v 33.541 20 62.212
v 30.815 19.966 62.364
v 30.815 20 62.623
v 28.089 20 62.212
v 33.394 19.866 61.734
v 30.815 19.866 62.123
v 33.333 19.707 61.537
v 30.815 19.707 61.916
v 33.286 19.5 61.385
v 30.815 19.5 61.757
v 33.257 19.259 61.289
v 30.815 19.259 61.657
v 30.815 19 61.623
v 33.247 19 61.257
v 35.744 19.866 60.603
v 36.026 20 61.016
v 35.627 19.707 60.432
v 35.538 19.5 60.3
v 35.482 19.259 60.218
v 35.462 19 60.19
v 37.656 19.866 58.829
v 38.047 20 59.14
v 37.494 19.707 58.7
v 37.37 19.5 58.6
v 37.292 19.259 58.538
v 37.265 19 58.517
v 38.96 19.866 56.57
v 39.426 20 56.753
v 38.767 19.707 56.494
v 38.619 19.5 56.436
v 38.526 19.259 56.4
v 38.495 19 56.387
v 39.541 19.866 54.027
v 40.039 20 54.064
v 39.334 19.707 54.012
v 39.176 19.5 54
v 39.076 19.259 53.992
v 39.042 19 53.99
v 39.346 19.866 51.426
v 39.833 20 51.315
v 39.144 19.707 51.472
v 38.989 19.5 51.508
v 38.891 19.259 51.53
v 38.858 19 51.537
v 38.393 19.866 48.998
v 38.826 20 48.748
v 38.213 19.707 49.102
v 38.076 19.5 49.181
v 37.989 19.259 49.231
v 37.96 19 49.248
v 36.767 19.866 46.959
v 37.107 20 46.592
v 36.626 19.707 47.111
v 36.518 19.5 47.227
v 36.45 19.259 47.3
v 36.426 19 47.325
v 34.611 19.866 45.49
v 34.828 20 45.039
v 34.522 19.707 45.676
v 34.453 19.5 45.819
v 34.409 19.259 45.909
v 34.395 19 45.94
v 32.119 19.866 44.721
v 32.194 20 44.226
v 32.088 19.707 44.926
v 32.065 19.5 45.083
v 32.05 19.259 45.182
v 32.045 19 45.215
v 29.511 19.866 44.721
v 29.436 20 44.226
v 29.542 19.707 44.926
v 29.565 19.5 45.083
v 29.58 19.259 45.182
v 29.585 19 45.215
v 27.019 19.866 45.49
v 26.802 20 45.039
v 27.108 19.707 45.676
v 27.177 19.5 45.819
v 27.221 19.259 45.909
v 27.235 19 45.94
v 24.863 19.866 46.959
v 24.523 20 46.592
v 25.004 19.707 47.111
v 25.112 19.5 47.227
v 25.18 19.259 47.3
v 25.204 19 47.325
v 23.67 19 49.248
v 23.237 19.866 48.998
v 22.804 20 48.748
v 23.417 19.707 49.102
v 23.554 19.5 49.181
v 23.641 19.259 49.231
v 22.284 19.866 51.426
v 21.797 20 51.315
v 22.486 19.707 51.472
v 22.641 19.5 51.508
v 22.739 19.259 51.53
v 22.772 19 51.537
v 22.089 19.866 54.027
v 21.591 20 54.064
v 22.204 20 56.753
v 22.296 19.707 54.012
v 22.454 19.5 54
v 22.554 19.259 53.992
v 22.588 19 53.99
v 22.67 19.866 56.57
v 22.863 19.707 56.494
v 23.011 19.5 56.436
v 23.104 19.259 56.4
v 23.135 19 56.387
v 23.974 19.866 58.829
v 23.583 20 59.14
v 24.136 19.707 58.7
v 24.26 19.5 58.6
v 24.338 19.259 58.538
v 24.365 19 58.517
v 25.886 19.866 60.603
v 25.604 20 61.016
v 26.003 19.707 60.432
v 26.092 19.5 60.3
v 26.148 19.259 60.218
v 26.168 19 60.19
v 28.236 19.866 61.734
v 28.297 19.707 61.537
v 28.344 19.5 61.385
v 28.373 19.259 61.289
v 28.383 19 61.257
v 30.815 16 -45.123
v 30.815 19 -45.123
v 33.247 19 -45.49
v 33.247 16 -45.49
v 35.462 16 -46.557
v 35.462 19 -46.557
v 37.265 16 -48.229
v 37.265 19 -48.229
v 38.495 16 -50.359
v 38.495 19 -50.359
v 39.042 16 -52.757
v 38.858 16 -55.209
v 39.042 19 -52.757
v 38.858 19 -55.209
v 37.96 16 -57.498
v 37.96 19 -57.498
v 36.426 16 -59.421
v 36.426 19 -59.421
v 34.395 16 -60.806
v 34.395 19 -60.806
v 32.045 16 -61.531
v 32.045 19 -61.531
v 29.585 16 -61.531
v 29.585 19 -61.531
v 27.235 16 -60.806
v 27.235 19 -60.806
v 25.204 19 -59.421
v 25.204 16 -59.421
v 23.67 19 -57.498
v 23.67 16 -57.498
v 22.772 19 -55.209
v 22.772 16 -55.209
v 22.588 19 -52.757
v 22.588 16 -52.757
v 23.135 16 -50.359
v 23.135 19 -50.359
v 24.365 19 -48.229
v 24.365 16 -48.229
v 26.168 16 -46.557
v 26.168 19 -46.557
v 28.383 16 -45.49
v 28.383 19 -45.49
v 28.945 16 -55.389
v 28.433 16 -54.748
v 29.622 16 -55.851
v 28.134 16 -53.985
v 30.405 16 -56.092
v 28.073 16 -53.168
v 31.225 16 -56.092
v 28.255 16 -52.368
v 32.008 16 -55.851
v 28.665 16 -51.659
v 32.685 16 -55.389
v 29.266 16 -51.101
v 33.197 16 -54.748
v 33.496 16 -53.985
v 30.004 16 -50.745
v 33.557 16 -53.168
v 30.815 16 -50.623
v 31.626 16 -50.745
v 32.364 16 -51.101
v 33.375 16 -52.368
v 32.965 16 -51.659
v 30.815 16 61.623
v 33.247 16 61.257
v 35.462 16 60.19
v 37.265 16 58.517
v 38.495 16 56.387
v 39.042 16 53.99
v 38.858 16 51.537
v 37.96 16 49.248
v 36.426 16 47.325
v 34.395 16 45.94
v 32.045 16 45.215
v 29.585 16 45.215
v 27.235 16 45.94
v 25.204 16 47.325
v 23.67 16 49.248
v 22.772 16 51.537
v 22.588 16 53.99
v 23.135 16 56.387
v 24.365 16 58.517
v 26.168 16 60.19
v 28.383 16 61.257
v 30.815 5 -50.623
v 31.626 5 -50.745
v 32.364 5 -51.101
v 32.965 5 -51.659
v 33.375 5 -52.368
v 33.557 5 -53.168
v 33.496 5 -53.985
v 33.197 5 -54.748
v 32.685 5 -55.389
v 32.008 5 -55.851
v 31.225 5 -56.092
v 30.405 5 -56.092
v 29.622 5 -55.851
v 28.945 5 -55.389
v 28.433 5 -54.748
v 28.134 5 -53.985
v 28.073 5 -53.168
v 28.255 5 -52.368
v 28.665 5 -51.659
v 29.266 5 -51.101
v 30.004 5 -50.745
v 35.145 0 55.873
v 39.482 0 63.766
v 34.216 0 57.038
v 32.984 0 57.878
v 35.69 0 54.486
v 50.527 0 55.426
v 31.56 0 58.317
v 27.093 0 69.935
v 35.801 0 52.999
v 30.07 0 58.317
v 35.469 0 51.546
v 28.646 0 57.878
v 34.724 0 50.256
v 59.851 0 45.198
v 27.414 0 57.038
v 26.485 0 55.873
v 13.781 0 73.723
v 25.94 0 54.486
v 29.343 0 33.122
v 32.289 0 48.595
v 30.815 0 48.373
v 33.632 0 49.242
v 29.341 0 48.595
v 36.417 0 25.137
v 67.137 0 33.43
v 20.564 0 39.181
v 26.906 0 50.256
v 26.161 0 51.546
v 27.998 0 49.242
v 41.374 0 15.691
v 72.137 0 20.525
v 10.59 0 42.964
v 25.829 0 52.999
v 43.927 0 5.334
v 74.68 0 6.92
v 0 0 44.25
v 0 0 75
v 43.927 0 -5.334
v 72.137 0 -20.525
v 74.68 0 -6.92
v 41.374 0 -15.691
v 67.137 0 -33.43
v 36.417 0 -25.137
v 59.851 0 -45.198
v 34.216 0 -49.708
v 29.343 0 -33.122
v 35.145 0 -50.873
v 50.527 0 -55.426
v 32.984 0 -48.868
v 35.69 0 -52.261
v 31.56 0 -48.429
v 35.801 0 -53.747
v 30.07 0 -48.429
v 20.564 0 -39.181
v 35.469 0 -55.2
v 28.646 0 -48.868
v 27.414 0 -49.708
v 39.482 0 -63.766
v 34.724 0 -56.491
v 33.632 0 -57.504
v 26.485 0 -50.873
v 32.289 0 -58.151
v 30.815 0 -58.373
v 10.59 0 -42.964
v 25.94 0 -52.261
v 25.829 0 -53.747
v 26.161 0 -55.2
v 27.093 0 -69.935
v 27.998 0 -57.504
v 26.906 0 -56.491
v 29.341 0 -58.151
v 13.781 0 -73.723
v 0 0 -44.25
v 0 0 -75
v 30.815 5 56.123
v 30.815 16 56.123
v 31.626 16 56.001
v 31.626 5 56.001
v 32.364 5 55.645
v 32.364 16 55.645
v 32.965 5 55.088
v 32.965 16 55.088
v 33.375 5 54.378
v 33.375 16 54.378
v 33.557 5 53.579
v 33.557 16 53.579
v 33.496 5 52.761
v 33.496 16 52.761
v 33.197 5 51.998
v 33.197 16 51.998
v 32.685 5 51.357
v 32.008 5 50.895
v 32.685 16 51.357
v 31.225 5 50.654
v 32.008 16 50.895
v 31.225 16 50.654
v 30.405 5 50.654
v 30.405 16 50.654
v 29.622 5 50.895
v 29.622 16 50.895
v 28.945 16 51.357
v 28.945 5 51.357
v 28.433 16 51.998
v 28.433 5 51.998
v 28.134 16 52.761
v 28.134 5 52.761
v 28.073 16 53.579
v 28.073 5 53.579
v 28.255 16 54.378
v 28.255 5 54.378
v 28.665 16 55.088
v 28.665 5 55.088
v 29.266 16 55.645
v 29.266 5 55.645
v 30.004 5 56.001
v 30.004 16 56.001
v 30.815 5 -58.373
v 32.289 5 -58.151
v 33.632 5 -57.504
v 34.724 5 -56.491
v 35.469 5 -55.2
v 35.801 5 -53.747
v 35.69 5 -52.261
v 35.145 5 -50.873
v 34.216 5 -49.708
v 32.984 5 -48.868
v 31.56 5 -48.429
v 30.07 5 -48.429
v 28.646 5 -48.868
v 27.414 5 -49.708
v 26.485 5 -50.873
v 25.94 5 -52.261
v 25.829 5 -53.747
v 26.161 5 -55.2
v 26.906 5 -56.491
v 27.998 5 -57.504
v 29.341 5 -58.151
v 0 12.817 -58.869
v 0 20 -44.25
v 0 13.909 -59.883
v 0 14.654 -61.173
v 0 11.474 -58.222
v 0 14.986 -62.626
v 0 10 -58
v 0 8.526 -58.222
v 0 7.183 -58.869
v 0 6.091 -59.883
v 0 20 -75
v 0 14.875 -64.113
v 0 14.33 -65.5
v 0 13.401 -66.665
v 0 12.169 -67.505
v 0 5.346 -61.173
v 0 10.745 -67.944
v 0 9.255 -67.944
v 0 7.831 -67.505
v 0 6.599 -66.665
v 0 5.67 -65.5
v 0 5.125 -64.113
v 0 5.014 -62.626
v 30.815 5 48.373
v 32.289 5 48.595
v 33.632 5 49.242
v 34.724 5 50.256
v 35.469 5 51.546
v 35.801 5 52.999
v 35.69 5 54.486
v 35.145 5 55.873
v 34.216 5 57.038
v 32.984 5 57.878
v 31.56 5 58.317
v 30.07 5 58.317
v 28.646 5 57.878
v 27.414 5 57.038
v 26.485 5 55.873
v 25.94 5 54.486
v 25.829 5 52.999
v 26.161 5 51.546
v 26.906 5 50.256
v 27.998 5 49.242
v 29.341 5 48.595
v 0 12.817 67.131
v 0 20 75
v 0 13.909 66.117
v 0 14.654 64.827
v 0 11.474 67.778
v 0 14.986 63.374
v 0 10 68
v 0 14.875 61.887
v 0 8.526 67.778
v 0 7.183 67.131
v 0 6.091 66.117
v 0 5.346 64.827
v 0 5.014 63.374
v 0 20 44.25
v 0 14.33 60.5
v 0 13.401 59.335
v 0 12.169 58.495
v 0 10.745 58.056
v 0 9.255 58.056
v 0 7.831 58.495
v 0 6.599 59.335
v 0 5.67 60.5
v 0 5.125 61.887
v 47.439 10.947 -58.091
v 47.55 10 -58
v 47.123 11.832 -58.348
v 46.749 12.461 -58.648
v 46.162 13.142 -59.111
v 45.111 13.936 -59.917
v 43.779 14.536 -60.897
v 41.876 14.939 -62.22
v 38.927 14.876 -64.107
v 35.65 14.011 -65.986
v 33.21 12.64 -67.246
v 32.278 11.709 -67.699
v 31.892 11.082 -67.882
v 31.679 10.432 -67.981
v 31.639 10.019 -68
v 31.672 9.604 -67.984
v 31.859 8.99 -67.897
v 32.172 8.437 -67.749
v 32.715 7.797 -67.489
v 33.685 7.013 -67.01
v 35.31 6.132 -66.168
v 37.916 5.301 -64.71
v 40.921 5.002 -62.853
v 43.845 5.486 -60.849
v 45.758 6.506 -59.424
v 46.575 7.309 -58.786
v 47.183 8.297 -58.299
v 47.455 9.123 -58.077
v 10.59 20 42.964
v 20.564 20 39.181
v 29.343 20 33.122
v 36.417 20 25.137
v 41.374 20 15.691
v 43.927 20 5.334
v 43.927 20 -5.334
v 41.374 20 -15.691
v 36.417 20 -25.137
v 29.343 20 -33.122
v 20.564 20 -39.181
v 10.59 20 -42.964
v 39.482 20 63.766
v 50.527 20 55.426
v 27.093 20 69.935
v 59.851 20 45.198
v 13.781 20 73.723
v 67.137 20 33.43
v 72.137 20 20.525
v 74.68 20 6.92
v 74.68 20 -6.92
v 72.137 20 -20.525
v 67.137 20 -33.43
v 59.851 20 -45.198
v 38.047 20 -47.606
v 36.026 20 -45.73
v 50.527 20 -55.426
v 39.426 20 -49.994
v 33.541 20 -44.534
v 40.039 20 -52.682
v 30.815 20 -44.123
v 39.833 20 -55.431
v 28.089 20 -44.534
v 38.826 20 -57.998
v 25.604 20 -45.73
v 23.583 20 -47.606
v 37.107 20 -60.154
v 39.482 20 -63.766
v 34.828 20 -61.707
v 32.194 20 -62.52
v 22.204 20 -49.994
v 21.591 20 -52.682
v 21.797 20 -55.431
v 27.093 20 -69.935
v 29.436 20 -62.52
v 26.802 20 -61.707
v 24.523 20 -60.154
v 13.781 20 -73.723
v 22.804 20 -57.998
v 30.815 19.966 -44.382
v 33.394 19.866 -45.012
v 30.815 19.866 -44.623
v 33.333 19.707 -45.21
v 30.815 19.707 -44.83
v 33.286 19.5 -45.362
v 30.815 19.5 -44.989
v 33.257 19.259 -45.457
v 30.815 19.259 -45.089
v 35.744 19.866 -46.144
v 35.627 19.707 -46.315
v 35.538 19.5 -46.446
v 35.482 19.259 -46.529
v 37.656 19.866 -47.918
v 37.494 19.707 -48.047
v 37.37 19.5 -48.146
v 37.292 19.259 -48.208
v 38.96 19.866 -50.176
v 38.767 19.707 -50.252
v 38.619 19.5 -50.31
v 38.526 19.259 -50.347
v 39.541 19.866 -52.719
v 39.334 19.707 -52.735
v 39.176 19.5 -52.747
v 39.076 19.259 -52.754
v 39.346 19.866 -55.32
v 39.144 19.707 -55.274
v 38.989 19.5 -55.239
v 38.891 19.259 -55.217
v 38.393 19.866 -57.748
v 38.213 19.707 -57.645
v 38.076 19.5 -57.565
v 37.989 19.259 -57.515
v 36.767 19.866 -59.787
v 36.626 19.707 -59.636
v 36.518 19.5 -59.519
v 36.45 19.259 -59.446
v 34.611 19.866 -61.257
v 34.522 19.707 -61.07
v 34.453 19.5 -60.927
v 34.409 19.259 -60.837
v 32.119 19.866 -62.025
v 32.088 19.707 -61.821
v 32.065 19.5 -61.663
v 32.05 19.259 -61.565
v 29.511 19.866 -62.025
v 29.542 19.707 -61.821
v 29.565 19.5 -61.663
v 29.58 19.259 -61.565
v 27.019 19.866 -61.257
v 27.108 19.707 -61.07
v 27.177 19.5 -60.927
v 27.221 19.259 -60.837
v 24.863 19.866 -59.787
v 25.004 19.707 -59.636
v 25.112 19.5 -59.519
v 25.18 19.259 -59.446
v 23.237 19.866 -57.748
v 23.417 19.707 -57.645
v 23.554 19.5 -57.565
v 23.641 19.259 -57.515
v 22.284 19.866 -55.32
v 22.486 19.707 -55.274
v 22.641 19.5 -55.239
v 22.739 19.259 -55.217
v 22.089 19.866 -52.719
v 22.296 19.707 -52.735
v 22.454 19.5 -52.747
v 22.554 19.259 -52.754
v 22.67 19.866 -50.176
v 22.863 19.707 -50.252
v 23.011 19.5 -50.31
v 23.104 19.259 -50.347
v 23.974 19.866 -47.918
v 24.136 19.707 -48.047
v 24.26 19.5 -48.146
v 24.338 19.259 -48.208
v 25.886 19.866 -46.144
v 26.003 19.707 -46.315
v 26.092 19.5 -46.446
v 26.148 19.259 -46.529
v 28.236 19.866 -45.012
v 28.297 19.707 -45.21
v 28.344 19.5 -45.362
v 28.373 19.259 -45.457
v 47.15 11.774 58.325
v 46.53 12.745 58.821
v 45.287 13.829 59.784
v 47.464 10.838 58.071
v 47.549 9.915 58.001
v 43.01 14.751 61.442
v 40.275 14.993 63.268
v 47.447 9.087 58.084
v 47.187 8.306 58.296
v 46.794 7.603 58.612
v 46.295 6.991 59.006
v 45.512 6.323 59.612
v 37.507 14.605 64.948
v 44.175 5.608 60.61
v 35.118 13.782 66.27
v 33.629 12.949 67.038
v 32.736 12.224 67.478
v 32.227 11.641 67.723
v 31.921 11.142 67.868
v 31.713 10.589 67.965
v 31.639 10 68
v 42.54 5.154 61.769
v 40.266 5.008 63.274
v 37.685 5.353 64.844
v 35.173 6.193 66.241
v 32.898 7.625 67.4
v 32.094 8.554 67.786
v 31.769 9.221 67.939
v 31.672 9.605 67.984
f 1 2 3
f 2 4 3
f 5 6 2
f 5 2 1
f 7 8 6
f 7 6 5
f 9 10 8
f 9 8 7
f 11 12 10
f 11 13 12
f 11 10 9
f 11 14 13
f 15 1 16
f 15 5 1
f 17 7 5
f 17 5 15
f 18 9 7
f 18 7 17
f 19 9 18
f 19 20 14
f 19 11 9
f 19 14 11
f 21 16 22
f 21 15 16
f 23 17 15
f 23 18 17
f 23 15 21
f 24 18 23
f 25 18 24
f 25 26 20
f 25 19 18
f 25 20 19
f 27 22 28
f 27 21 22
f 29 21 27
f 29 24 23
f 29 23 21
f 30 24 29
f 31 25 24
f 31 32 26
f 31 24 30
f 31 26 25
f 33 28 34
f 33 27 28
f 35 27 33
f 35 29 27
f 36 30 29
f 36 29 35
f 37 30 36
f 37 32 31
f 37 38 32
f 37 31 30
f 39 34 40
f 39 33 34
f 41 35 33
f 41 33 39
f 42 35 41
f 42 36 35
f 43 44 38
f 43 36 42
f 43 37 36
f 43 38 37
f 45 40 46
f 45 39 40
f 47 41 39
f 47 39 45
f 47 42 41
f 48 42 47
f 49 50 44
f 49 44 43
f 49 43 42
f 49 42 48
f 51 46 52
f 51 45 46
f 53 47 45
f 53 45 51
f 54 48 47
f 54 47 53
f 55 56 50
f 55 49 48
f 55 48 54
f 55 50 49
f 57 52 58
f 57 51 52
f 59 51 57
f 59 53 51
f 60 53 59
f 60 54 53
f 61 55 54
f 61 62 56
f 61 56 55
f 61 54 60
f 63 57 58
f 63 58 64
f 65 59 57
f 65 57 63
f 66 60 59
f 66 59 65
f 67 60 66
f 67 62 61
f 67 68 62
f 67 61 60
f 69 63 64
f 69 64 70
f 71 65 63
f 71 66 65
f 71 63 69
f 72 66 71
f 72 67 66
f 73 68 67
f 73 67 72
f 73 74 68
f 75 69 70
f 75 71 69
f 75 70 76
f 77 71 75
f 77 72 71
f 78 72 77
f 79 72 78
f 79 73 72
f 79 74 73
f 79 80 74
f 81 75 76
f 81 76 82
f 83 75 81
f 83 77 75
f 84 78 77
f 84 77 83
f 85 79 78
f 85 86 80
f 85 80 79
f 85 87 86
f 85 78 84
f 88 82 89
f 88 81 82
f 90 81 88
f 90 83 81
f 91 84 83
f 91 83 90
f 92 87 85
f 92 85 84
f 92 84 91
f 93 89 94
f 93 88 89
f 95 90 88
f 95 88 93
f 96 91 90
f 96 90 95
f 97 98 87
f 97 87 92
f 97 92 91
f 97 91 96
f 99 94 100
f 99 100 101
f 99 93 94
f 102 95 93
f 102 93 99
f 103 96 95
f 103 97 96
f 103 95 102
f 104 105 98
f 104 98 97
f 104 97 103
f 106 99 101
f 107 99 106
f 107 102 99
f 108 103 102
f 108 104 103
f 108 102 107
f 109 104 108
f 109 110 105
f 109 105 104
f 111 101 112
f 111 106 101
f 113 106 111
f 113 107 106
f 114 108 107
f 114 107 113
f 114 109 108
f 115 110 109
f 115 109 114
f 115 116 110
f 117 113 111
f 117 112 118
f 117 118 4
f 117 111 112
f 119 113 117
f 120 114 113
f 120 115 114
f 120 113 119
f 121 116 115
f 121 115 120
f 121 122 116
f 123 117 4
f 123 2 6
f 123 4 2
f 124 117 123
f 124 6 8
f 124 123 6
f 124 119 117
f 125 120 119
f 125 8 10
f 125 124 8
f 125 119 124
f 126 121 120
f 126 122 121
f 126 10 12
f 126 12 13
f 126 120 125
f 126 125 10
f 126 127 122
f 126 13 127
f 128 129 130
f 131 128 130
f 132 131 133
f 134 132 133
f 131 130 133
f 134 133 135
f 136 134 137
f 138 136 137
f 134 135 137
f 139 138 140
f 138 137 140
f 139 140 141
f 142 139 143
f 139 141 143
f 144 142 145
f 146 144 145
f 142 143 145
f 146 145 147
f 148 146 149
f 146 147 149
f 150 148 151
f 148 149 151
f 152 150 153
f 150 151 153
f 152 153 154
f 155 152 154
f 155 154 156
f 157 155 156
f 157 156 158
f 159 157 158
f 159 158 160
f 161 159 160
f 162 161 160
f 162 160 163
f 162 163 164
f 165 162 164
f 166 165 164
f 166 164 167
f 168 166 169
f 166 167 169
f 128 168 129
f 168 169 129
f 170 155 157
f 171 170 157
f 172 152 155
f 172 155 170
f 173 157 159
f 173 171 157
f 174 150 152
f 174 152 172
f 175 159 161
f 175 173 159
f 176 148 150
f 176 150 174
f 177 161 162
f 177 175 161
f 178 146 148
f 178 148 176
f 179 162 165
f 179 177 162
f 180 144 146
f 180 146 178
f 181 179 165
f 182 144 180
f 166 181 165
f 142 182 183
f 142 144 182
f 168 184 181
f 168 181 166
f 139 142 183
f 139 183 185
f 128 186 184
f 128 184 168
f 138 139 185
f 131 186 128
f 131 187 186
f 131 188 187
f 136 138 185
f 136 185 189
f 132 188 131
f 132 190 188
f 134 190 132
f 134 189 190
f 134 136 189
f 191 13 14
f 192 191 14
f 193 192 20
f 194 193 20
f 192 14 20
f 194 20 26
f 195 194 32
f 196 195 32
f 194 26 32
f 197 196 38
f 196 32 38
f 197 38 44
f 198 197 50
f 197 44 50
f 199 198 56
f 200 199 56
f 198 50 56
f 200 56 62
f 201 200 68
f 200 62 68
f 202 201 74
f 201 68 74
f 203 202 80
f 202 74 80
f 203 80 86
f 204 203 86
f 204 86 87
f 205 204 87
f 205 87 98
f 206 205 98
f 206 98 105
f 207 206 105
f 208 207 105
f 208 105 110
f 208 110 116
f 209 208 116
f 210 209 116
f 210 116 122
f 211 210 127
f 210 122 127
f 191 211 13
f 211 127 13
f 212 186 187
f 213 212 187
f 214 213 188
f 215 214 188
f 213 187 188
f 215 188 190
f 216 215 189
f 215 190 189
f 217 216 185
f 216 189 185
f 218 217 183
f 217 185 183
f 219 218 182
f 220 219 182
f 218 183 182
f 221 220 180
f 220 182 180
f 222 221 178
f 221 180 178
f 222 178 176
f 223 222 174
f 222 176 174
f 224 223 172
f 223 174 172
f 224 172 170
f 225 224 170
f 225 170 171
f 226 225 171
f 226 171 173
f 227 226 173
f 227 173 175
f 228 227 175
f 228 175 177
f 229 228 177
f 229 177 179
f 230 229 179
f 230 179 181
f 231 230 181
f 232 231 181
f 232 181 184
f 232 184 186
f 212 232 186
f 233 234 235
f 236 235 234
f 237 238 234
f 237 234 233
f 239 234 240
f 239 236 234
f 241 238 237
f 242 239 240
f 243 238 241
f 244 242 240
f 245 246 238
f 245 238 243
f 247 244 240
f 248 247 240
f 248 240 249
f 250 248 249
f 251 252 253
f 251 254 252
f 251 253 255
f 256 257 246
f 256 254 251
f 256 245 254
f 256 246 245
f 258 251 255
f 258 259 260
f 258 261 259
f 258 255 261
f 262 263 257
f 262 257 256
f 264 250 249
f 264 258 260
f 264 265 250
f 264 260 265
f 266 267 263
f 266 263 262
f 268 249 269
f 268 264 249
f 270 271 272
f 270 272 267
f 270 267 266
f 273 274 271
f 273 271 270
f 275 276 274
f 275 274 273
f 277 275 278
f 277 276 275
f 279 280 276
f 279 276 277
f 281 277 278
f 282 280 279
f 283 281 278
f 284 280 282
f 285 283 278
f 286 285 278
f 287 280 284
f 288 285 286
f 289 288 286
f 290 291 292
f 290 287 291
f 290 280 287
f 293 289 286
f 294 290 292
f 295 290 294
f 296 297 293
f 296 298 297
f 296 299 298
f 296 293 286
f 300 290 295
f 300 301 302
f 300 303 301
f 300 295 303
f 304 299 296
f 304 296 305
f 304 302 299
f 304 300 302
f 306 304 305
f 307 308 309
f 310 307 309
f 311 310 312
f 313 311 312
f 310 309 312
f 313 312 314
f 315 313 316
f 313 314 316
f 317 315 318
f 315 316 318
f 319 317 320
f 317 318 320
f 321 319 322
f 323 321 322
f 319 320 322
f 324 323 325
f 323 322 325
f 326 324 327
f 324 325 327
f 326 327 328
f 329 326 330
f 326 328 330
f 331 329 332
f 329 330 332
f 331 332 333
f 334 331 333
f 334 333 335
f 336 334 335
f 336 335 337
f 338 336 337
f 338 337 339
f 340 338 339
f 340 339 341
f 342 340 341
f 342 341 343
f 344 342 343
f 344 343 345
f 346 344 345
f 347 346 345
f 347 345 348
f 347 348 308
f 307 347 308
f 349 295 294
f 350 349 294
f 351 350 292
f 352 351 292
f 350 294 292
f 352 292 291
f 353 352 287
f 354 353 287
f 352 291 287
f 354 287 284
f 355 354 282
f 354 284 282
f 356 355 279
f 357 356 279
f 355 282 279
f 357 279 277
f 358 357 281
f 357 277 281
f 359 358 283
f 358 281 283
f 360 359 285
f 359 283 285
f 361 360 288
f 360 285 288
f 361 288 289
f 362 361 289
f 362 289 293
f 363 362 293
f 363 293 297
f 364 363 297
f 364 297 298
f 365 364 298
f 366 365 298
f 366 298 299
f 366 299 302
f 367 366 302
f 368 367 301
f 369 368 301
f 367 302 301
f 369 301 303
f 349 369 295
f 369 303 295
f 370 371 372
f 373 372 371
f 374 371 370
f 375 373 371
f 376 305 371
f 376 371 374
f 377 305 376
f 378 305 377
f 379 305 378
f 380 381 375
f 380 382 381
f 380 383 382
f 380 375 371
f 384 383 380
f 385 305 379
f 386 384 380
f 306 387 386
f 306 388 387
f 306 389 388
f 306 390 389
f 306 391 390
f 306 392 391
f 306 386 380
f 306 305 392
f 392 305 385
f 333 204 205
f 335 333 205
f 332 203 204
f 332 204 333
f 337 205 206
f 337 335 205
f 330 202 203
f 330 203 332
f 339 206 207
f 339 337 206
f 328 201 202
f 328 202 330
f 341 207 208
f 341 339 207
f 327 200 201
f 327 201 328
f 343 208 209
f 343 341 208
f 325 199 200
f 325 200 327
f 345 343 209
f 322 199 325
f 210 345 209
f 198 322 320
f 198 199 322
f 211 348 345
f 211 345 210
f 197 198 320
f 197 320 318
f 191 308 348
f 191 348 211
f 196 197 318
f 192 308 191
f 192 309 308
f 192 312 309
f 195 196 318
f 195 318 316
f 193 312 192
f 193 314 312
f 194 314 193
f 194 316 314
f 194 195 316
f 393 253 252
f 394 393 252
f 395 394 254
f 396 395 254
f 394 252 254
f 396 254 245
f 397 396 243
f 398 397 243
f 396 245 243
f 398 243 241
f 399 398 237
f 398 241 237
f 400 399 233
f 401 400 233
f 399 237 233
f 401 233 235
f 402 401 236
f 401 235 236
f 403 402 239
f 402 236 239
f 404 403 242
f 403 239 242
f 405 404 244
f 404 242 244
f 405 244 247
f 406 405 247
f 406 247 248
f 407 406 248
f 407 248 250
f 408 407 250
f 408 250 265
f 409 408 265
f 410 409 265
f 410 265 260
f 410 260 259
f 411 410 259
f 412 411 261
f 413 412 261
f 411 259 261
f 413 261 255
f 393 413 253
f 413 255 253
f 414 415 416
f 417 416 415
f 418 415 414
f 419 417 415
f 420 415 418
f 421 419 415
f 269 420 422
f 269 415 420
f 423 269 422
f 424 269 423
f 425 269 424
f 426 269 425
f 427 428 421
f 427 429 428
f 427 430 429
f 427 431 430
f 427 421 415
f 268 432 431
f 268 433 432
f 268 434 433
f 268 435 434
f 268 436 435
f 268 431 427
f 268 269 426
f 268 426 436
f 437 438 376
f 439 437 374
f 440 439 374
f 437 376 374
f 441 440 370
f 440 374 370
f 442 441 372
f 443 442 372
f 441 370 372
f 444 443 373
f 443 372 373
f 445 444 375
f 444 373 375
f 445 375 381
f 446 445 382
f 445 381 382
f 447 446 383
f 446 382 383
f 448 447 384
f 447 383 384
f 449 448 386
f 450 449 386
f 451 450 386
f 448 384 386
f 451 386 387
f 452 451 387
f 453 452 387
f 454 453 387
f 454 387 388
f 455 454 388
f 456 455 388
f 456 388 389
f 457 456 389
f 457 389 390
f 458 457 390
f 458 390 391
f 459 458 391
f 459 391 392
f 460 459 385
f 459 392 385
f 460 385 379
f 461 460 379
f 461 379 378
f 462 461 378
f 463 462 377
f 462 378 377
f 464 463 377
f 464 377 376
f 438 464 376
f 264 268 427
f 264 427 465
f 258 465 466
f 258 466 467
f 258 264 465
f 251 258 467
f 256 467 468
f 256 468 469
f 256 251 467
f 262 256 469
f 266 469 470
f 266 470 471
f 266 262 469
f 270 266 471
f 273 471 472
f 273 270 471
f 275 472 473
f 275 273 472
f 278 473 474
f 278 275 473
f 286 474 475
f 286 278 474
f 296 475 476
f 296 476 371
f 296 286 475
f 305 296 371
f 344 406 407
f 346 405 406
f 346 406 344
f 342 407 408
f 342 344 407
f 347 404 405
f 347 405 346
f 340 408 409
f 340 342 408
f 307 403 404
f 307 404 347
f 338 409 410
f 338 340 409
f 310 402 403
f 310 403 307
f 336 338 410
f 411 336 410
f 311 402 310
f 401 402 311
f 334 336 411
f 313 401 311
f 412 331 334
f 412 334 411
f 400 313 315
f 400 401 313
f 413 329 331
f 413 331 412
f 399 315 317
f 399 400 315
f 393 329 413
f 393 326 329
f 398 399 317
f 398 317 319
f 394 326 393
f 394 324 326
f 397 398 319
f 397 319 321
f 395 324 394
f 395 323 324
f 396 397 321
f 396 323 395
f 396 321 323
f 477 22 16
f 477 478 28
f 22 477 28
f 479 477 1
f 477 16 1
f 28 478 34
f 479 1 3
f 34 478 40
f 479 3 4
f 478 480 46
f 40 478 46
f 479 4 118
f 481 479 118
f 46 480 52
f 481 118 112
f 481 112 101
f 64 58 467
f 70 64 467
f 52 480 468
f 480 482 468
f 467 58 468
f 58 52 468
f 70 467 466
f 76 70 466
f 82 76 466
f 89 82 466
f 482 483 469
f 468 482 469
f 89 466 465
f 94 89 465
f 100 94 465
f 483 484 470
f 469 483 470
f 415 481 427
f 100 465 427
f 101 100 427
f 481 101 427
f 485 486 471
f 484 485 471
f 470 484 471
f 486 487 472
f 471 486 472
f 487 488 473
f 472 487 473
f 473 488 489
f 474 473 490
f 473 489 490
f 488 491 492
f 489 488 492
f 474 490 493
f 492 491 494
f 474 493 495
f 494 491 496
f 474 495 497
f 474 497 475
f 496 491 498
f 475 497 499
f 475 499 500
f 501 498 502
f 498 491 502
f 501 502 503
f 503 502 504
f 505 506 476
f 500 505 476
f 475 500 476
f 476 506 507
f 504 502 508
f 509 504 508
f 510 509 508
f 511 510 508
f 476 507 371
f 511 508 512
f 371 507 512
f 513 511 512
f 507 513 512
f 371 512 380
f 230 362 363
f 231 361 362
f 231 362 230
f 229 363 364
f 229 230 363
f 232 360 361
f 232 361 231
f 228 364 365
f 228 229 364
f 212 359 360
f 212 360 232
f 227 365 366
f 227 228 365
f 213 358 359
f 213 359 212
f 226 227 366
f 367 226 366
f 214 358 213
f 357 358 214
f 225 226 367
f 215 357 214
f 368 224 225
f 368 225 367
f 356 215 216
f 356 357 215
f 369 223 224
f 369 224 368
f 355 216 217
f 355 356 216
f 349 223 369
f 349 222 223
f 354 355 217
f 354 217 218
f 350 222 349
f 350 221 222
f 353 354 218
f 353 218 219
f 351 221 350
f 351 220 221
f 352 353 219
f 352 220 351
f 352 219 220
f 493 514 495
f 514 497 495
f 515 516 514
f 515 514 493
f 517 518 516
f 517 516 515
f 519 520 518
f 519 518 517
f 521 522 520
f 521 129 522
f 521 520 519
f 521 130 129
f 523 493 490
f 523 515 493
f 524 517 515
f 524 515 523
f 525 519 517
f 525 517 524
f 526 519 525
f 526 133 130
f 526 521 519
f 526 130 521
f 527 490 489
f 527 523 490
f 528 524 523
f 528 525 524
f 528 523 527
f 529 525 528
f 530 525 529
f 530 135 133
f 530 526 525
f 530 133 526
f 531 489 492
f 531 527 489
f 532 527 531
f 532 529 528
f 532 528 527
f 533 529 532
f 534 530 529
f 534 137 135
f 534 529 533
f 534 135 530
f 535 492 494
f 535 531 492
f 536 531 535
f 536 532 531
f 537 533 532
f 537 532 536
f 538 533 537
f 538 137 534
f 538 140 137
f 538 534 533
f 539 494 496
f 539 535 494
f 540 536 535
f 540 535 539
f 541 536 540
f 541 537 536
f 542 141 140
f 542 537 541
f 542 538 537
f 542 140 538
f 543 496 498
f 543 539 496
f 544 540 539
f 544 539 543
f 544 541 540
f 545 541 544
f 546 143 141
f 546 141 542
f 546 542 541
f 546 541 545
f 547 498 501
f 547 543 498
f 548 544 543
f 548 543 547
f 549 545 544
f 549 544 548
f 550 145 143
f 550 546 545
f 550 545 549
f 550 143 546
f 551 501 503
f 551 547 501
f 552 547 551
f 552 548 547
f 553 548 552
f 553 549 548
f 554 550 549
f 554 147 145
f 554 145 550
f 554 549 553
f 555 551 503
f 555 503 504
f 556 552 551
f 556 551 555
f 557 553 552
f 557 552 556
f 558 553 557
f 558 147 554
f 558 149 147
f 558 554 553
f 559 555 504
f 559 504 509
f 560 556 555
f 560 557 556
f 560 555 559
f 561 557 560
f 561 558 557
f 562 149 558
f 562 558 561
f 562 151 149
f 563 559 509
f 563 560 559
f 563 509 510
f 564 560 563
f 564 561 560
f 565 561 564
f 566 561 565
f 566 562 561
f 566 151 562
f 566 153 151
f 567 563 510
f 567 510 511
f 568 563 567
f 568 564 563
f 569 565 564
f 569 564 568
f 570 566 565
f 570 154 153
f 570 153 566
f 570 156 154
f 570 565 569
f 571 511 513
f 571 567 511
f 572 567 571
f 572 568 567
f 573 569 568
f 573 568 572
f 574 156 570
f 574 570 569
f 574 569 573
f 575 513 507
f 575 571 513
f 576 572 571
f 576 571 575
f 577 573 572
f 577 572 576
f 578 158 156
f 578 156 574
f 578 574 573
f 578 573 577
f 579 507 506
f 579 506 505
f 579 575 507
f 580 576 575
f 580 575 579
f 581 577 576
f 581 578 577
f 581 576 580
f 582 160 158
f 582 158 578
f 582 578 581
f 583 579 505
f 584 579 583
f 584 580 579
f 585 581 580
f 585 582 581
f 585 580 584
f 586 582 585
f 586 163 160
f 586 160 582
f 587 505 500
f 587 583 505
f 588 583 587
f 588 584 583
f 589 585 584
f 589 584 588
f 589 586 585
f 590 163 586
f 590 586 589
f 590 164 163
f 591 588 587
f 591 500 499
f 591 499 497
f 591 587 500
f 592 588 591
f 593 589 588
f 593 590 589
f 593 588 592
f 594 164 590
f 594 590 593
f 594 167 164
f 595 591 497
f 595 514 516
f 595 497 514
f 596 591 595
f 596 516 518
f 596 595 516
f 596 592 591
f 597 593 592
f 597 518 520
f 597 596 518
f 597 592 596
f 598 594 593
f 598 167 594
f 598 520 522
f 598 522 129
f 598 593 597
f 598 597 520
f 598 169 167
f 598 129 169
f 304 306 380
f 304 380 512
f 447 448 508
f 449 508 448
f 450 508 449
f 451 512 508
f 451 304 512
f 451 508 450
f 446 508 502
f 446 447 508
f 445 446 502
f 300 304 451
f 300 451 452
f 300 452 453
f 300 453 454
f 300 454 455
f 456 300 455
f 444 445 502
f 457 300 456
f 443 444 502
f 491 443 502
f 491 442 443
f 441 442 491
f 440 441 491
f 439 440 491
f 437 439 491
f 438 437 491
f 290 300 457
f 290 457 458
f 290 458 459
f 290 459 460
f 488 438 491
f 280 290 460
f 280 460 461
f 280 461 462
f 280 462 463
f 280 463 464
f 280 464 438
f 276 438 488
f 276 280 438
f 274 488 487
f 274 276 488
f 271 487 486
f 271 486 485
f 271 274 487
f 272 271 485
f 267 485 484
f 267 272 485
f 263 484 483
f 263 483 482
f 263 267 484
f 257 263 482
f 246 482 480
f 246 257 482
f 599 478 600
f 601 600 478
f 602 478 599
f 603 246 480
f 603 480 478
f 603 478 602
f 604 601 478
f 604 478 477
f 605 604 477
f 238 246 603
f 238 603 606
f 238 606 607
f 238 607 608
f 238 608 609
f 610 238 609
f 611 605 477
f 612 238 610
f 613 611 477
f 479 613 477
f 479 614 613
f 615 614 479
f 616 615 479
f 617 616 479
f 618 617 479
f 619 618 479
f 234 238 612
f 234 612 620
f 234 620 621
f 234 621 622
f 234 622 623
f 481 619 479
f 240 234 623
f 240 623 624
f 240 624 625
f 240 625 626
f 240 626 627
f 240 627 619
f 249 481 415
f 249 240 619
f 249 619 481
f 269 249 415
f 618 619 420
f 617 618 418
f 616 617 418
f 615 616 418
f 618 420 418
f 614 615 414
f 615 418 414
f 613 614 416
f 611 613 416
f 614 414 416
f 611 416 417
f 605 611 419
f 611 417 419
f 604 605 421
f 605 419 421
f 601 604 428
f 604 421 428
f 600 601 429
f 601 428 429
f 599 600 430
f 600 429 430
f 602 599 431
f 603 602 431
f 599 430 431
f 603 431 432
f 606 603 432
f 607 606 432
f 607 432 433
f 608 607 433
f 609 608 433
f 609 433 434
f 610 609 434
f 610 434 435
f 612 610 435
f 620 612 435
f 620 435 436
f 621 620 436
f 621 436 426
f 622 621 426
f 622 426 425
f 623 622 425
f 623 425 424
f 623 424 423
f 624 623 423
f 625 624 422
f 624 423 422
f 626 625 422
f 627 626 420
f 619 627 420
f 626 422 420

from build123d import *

# Parameters (mm, degrees)
BOSS_EXTRUDE1_DEPTH = 20
SKETCH2_R           = 5
CUT_EXTRUDE1_DEPTH  = 150
SKETCH3_R           = 8.25
CUT_EXTRUDE3_DEPTH  = 4
SKETCH4_R           = 2.75
CUT_EXTRUDE4_DEPTH  = 20
SKETCH5_R           = 5
CUT_EXTRUDE5_DEPTH  = 5
FILLET1_R           = 1


with BuildPart() as part:
    # Sketch1 → Boss-Extrude1 (new body)
    with BuildSketch(Plane(origin=(0, 0, 0), x_dir=(1, 0, 0), z_dir=(0, 1, 0))):
        with BuildLine():
            Line((0, 44.25), (0, 75))
            ThreePointArc((0, 75), (75, 0), (0, -75))
            Line((0, -75), (0, -44.25))
            ThreePointArc((0, -44.25), (44.25, 0), (0, 44.25))
        make_face()
    extrude(amount=BOSS_EXTRUDE1_DEPTH)

    # Sketch2 → Cut-Extrude1 (cut)
    with BuildSketch(Plane.ZY):
        with Locations((-63, 10)):
            Circle(SKETCH2_R)
        with Locations((63, 10)):
            Circle(SKETCH2_R)
    extrude(amount=-CUT_EXTRUDE1_DEPTH, mode=Mode.SUBTRACT)

    # Sketch3 → Cut-Extrude3 (cut)
    with BuildSketch(Plane(origin=(0, 20, 0), x_dir=(1, 0, 0), z_dir=(0, 1, 0))):
        with Locations(Location((30.815, -53.373145635, 0), (0, 0, 270))):
            Circle(SKETCH3_R)
        with Locations(Location((30.815, 53.373145635, 0), (0, 0, 270))):
            Circle(SKETCH3_R)
    extrude(amount=-CUT_EXTRUDE3_DEPTH, mode=Mode.SUBTRACT)

    # Sketch4 → Cut-Extrude4 (cut)
    with BuildSketch(Plane(origin=(0, 16, 0), x_dir=(1, 0, 0), z_dir=(0, 1, 0))):
        with Locations(Location((30.815, 53.373145635, 0), (0, 0, 270))):
            Circle(SKETCH4_R)
        with Locations(Location((30.815, -53.373145635, 0), (0, 0, 270))):
            Circle(SKETCH4_R)
    extrude(amount=-CUT_EXTRUDE4_DEPTH, mode=Mode.SUBTRACT)

    # Sketch5 → Cut-Extrude5 (cut)
    with BuildSketch(Plane.XZ):
        with Locations(Location((30.815, 53.373145635, 0), (0, 0, 270))):
            Circle(SKETCH5_R)
        with Locations(Location((30.815, -53.373145635, 0), (0, 0, 270))):
            Circle(SKETCH5_R)
    extrude(amount=-CUT_EXTRUDE5_DEPTH, mode=Mode.SUBTRACT)

    # Fillet1
    fillet1_edges = [part.edges().sort_by_distance(p)[0] for p in [
        (30.815, 20, 45.123145635),
        (30.815, 20, -61.623145635),
    ]]
    fillet(fillet1_edges, radius=FILLET1_R)


solid = part.part
